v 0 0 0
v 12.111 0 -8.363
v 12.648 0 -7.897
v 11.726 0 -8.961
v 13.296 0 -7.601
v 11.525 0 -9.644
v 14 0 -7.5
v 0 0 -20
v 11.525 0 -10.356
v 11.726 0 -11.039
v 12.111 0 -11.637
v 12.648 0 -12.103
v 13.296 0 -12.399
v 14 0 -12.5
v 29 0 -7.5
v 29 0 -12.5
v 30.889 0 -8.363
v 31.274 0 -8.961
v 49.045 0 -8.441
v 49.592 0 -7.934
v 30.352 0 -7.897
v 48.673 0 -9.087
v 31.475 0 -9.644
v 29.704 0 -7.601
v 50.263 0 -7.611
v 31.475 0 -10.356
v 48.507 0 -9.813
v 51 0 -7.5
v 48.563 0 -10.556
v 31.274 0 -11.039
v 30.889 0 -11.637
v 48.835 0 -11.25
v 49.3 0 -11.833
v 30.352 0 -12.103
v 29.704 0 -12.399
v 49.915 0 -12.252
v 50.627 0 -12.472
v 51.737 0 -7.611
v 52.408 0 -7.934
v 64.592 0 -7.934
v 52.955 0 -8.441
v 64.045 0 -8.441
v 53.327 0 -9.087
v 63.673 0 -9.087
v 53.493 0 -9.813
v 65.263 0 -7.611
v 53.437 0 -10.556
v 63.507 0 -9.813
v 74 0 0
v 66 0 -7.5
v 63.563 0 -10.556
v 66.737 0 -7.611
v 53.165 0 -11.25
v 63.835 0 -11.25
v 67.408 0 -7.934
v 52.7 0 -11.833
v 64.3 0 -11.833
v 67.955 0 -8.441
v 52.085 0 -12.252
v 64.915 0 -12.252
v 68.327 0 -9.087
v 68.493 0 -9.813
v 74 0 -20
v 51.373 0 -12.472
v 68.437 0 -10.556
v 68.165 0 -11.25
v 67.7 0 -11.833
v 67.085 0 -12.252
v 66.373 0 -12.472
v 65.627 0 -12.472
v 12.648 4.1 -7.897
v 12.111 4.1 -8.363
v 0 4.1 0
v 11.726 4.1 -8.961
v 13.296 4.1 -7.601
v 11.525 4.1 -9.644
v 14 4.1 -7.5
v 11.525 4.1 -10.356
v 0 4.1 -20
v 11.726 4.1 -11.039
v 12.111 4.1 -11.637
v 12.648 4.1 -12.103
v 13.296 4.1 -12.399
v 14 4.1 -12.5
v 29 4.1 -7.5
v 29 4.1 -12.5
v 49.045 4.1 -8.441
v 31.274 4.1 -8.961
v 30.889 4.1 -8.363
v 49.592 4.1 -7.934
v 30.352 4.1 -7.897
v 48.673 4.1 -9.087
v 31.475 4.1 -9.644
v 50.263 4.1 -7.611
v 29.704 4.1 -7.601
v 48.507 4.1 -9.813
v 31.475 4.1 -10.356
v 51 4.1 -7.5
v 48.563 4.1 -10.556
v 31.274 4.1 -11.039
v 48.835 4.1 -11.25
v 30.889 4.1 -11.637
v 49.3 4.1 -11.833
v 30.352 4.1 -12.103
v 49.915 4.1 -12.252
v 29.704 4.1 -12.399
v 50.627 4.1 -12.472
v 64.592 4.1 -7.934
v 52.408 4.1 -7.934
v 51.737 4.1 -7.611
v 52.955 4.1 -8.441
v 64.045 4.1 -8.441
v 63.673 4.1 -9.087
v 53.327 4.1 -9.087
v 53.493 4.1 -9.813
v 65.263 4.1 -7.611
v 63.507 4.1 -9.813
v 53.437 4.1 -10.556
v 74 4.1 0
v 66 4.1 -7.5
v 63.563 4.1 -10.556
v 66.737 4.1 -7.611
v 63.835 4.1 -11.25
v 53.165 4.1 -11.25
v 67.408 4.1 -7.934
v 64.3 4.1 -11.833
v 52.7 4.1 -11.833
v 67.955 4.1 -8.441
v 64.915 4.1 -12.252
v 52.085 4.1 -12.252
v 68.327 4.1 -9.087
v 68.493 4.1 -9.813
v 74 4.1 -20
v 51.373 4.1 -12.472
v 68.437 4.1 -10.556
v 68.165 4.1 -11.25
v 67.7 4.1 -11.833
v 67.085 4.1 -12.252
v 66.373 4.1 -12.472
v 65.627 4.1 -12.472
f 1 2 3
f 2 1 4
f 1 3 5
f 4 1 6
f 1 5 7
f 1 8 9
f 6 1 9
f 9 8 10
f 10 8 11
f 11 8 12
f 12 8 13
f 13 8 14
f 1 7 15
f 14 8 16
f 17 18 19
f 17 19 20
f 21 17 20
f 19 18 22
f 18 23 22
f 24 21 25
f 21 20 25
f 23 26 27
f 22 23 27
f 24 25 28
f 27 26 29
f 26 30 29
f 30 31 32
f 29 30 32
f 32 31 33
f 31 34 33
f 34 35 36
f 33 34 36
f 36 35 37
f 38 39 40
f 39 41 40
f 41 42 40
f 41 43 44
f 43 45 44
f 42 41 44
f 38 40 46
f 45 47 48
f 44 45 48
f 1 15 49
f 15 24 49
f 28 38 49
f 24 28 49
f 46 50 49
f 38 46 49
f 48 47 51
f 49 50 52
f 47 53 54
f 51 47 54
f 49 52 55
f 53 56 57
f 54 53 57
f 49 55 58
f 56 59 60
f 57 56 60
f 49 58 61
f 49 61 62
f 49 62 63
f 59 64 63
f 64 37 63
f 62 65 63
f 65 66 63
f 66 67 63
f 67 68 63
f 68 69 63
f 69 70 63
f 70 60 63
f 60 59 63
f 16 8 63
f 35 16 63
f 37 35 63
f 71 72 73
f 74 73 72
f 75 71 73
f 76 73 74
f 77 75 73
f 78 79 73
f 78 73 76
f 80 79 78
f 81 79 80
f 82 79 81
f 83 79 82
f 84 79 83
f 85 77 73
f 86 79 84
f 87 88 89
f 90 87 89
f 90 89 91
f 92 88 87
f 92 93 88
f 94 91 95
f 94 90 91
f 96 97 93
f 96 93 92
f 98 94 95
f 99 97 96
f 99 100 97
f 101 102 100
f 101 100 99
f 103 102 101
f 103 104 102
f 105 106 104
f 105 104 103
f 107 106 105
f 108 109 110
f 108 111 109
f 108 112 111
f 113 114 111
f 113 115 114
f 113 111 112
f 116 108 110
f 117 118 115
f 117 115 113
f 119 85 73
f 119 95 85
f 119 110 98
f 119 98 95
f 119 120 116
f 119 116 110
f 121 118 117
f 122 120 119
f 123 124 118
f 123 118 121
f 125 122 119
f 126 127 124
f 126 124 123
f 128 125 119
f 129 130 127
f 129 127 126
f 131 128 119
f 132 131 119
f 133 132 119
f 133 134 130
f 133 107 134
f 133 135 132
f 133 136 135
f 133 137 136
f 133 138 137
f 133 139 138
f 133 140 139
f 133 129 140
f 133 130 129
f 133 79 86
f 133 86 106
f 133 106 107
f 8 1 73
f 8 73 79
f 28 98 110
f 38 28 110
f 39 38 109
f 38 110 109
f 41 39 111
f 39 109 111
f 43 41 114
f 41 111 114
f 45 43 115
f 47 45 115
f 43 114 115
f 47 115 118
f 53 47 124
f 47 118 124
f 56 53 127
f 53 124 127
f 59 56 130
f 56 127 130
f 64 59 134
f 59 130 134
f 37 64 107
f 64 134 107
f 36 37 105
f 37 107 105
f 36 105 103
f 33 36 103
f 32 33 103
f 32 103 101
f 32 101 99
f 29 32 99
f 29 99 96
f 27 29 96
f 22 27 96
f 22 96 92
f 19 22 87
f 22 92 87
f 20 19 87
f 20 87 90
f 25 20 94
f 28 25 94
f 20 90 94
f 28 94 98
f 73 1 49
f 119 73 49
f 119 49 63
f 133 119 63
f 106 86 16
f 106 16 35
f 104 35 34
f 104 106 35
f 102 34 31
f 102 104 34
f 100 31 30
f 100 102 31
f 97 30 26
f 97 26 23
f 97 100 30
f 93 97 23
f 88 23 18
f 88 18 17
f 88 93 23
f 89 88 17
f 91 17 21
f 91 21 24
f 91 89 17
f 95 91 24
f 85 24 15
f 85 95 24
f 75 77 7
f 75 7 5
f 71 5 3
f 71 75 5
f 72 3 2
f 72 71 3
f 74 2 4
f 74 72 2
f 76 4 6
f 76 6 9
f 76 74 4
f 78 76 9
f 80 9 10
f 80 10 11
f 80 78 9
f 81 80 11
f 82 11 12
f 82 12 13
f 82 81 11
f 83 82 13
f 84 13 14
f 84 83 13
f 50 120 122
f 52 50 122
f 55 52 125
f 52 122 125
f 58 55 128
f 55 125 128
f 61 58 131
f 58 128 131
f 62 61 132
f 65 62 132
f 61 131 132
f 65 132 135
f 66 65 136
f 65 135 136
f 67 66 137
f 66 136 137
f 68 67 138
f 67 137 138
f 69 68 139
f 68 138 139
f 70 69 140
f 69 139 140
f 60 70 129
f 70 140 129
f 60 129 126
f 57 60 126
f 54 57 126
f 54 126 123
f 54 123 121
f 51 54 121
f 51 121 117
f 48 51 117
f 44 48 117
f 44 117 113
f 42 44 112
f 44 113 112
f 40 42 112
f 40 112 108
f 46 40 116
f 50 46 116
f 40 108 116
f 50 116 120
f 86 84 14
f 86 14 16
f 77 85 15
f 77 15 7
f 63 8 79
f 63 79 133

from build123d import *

# Parameters (mm, degrees)
SKETCH_1_W          = 74
SKETCH_1_H          = 20
EXTRUDE_1_DEPTH     = 4.1
SKETCH_2_R          = 2.5
CUT_EXTRUDE_1_DEPTH = 4.1


with BuildPart() as part:
    # 草图1 → 凸台-拉伸1 (new body)
    with BuildSketch(Plane(origin=(0, 0, 0), x_dir=(1, 0, 0), z_dir=(0, 1, 0))):
        with Locations((37, 10)):
            Rectangle(SKETCH_1_W, SKETCH_1_H)
    extrude(amount=EXTRUDE_1_DEPTH)

    # 草图2 → 切除-拉伸1 (cut)
    with BuildSketch(Plane(origin=(0, 4.1, 0), x_dir=(1, 0, 0), z_dir=(0, 1, 0))):
        with Locations(Location((66, 10, 0), (0, 0, 270))):
            Circle(SKETCH_2_R)
        with Locations(Location((51, 10, 0), (0, 0, 270))):
            Circle(SKETCH_2_R)
        with BuildLine():
            Line((14, 12.5), (29, 12.5))
            ThreePointArc((29, 12.5), (31.5, 10), (29, 7.5))
            Line((29, 7.5), (14, 7.5))
            ThreePointArc((14, 7.5), (11.5, 10), (14, 12.5))
        make_face()
    extrude(amount=-CUT_EXTRUDE_1_DEPTH, mode=Mode.SUBTRACT)


solid = part.part
